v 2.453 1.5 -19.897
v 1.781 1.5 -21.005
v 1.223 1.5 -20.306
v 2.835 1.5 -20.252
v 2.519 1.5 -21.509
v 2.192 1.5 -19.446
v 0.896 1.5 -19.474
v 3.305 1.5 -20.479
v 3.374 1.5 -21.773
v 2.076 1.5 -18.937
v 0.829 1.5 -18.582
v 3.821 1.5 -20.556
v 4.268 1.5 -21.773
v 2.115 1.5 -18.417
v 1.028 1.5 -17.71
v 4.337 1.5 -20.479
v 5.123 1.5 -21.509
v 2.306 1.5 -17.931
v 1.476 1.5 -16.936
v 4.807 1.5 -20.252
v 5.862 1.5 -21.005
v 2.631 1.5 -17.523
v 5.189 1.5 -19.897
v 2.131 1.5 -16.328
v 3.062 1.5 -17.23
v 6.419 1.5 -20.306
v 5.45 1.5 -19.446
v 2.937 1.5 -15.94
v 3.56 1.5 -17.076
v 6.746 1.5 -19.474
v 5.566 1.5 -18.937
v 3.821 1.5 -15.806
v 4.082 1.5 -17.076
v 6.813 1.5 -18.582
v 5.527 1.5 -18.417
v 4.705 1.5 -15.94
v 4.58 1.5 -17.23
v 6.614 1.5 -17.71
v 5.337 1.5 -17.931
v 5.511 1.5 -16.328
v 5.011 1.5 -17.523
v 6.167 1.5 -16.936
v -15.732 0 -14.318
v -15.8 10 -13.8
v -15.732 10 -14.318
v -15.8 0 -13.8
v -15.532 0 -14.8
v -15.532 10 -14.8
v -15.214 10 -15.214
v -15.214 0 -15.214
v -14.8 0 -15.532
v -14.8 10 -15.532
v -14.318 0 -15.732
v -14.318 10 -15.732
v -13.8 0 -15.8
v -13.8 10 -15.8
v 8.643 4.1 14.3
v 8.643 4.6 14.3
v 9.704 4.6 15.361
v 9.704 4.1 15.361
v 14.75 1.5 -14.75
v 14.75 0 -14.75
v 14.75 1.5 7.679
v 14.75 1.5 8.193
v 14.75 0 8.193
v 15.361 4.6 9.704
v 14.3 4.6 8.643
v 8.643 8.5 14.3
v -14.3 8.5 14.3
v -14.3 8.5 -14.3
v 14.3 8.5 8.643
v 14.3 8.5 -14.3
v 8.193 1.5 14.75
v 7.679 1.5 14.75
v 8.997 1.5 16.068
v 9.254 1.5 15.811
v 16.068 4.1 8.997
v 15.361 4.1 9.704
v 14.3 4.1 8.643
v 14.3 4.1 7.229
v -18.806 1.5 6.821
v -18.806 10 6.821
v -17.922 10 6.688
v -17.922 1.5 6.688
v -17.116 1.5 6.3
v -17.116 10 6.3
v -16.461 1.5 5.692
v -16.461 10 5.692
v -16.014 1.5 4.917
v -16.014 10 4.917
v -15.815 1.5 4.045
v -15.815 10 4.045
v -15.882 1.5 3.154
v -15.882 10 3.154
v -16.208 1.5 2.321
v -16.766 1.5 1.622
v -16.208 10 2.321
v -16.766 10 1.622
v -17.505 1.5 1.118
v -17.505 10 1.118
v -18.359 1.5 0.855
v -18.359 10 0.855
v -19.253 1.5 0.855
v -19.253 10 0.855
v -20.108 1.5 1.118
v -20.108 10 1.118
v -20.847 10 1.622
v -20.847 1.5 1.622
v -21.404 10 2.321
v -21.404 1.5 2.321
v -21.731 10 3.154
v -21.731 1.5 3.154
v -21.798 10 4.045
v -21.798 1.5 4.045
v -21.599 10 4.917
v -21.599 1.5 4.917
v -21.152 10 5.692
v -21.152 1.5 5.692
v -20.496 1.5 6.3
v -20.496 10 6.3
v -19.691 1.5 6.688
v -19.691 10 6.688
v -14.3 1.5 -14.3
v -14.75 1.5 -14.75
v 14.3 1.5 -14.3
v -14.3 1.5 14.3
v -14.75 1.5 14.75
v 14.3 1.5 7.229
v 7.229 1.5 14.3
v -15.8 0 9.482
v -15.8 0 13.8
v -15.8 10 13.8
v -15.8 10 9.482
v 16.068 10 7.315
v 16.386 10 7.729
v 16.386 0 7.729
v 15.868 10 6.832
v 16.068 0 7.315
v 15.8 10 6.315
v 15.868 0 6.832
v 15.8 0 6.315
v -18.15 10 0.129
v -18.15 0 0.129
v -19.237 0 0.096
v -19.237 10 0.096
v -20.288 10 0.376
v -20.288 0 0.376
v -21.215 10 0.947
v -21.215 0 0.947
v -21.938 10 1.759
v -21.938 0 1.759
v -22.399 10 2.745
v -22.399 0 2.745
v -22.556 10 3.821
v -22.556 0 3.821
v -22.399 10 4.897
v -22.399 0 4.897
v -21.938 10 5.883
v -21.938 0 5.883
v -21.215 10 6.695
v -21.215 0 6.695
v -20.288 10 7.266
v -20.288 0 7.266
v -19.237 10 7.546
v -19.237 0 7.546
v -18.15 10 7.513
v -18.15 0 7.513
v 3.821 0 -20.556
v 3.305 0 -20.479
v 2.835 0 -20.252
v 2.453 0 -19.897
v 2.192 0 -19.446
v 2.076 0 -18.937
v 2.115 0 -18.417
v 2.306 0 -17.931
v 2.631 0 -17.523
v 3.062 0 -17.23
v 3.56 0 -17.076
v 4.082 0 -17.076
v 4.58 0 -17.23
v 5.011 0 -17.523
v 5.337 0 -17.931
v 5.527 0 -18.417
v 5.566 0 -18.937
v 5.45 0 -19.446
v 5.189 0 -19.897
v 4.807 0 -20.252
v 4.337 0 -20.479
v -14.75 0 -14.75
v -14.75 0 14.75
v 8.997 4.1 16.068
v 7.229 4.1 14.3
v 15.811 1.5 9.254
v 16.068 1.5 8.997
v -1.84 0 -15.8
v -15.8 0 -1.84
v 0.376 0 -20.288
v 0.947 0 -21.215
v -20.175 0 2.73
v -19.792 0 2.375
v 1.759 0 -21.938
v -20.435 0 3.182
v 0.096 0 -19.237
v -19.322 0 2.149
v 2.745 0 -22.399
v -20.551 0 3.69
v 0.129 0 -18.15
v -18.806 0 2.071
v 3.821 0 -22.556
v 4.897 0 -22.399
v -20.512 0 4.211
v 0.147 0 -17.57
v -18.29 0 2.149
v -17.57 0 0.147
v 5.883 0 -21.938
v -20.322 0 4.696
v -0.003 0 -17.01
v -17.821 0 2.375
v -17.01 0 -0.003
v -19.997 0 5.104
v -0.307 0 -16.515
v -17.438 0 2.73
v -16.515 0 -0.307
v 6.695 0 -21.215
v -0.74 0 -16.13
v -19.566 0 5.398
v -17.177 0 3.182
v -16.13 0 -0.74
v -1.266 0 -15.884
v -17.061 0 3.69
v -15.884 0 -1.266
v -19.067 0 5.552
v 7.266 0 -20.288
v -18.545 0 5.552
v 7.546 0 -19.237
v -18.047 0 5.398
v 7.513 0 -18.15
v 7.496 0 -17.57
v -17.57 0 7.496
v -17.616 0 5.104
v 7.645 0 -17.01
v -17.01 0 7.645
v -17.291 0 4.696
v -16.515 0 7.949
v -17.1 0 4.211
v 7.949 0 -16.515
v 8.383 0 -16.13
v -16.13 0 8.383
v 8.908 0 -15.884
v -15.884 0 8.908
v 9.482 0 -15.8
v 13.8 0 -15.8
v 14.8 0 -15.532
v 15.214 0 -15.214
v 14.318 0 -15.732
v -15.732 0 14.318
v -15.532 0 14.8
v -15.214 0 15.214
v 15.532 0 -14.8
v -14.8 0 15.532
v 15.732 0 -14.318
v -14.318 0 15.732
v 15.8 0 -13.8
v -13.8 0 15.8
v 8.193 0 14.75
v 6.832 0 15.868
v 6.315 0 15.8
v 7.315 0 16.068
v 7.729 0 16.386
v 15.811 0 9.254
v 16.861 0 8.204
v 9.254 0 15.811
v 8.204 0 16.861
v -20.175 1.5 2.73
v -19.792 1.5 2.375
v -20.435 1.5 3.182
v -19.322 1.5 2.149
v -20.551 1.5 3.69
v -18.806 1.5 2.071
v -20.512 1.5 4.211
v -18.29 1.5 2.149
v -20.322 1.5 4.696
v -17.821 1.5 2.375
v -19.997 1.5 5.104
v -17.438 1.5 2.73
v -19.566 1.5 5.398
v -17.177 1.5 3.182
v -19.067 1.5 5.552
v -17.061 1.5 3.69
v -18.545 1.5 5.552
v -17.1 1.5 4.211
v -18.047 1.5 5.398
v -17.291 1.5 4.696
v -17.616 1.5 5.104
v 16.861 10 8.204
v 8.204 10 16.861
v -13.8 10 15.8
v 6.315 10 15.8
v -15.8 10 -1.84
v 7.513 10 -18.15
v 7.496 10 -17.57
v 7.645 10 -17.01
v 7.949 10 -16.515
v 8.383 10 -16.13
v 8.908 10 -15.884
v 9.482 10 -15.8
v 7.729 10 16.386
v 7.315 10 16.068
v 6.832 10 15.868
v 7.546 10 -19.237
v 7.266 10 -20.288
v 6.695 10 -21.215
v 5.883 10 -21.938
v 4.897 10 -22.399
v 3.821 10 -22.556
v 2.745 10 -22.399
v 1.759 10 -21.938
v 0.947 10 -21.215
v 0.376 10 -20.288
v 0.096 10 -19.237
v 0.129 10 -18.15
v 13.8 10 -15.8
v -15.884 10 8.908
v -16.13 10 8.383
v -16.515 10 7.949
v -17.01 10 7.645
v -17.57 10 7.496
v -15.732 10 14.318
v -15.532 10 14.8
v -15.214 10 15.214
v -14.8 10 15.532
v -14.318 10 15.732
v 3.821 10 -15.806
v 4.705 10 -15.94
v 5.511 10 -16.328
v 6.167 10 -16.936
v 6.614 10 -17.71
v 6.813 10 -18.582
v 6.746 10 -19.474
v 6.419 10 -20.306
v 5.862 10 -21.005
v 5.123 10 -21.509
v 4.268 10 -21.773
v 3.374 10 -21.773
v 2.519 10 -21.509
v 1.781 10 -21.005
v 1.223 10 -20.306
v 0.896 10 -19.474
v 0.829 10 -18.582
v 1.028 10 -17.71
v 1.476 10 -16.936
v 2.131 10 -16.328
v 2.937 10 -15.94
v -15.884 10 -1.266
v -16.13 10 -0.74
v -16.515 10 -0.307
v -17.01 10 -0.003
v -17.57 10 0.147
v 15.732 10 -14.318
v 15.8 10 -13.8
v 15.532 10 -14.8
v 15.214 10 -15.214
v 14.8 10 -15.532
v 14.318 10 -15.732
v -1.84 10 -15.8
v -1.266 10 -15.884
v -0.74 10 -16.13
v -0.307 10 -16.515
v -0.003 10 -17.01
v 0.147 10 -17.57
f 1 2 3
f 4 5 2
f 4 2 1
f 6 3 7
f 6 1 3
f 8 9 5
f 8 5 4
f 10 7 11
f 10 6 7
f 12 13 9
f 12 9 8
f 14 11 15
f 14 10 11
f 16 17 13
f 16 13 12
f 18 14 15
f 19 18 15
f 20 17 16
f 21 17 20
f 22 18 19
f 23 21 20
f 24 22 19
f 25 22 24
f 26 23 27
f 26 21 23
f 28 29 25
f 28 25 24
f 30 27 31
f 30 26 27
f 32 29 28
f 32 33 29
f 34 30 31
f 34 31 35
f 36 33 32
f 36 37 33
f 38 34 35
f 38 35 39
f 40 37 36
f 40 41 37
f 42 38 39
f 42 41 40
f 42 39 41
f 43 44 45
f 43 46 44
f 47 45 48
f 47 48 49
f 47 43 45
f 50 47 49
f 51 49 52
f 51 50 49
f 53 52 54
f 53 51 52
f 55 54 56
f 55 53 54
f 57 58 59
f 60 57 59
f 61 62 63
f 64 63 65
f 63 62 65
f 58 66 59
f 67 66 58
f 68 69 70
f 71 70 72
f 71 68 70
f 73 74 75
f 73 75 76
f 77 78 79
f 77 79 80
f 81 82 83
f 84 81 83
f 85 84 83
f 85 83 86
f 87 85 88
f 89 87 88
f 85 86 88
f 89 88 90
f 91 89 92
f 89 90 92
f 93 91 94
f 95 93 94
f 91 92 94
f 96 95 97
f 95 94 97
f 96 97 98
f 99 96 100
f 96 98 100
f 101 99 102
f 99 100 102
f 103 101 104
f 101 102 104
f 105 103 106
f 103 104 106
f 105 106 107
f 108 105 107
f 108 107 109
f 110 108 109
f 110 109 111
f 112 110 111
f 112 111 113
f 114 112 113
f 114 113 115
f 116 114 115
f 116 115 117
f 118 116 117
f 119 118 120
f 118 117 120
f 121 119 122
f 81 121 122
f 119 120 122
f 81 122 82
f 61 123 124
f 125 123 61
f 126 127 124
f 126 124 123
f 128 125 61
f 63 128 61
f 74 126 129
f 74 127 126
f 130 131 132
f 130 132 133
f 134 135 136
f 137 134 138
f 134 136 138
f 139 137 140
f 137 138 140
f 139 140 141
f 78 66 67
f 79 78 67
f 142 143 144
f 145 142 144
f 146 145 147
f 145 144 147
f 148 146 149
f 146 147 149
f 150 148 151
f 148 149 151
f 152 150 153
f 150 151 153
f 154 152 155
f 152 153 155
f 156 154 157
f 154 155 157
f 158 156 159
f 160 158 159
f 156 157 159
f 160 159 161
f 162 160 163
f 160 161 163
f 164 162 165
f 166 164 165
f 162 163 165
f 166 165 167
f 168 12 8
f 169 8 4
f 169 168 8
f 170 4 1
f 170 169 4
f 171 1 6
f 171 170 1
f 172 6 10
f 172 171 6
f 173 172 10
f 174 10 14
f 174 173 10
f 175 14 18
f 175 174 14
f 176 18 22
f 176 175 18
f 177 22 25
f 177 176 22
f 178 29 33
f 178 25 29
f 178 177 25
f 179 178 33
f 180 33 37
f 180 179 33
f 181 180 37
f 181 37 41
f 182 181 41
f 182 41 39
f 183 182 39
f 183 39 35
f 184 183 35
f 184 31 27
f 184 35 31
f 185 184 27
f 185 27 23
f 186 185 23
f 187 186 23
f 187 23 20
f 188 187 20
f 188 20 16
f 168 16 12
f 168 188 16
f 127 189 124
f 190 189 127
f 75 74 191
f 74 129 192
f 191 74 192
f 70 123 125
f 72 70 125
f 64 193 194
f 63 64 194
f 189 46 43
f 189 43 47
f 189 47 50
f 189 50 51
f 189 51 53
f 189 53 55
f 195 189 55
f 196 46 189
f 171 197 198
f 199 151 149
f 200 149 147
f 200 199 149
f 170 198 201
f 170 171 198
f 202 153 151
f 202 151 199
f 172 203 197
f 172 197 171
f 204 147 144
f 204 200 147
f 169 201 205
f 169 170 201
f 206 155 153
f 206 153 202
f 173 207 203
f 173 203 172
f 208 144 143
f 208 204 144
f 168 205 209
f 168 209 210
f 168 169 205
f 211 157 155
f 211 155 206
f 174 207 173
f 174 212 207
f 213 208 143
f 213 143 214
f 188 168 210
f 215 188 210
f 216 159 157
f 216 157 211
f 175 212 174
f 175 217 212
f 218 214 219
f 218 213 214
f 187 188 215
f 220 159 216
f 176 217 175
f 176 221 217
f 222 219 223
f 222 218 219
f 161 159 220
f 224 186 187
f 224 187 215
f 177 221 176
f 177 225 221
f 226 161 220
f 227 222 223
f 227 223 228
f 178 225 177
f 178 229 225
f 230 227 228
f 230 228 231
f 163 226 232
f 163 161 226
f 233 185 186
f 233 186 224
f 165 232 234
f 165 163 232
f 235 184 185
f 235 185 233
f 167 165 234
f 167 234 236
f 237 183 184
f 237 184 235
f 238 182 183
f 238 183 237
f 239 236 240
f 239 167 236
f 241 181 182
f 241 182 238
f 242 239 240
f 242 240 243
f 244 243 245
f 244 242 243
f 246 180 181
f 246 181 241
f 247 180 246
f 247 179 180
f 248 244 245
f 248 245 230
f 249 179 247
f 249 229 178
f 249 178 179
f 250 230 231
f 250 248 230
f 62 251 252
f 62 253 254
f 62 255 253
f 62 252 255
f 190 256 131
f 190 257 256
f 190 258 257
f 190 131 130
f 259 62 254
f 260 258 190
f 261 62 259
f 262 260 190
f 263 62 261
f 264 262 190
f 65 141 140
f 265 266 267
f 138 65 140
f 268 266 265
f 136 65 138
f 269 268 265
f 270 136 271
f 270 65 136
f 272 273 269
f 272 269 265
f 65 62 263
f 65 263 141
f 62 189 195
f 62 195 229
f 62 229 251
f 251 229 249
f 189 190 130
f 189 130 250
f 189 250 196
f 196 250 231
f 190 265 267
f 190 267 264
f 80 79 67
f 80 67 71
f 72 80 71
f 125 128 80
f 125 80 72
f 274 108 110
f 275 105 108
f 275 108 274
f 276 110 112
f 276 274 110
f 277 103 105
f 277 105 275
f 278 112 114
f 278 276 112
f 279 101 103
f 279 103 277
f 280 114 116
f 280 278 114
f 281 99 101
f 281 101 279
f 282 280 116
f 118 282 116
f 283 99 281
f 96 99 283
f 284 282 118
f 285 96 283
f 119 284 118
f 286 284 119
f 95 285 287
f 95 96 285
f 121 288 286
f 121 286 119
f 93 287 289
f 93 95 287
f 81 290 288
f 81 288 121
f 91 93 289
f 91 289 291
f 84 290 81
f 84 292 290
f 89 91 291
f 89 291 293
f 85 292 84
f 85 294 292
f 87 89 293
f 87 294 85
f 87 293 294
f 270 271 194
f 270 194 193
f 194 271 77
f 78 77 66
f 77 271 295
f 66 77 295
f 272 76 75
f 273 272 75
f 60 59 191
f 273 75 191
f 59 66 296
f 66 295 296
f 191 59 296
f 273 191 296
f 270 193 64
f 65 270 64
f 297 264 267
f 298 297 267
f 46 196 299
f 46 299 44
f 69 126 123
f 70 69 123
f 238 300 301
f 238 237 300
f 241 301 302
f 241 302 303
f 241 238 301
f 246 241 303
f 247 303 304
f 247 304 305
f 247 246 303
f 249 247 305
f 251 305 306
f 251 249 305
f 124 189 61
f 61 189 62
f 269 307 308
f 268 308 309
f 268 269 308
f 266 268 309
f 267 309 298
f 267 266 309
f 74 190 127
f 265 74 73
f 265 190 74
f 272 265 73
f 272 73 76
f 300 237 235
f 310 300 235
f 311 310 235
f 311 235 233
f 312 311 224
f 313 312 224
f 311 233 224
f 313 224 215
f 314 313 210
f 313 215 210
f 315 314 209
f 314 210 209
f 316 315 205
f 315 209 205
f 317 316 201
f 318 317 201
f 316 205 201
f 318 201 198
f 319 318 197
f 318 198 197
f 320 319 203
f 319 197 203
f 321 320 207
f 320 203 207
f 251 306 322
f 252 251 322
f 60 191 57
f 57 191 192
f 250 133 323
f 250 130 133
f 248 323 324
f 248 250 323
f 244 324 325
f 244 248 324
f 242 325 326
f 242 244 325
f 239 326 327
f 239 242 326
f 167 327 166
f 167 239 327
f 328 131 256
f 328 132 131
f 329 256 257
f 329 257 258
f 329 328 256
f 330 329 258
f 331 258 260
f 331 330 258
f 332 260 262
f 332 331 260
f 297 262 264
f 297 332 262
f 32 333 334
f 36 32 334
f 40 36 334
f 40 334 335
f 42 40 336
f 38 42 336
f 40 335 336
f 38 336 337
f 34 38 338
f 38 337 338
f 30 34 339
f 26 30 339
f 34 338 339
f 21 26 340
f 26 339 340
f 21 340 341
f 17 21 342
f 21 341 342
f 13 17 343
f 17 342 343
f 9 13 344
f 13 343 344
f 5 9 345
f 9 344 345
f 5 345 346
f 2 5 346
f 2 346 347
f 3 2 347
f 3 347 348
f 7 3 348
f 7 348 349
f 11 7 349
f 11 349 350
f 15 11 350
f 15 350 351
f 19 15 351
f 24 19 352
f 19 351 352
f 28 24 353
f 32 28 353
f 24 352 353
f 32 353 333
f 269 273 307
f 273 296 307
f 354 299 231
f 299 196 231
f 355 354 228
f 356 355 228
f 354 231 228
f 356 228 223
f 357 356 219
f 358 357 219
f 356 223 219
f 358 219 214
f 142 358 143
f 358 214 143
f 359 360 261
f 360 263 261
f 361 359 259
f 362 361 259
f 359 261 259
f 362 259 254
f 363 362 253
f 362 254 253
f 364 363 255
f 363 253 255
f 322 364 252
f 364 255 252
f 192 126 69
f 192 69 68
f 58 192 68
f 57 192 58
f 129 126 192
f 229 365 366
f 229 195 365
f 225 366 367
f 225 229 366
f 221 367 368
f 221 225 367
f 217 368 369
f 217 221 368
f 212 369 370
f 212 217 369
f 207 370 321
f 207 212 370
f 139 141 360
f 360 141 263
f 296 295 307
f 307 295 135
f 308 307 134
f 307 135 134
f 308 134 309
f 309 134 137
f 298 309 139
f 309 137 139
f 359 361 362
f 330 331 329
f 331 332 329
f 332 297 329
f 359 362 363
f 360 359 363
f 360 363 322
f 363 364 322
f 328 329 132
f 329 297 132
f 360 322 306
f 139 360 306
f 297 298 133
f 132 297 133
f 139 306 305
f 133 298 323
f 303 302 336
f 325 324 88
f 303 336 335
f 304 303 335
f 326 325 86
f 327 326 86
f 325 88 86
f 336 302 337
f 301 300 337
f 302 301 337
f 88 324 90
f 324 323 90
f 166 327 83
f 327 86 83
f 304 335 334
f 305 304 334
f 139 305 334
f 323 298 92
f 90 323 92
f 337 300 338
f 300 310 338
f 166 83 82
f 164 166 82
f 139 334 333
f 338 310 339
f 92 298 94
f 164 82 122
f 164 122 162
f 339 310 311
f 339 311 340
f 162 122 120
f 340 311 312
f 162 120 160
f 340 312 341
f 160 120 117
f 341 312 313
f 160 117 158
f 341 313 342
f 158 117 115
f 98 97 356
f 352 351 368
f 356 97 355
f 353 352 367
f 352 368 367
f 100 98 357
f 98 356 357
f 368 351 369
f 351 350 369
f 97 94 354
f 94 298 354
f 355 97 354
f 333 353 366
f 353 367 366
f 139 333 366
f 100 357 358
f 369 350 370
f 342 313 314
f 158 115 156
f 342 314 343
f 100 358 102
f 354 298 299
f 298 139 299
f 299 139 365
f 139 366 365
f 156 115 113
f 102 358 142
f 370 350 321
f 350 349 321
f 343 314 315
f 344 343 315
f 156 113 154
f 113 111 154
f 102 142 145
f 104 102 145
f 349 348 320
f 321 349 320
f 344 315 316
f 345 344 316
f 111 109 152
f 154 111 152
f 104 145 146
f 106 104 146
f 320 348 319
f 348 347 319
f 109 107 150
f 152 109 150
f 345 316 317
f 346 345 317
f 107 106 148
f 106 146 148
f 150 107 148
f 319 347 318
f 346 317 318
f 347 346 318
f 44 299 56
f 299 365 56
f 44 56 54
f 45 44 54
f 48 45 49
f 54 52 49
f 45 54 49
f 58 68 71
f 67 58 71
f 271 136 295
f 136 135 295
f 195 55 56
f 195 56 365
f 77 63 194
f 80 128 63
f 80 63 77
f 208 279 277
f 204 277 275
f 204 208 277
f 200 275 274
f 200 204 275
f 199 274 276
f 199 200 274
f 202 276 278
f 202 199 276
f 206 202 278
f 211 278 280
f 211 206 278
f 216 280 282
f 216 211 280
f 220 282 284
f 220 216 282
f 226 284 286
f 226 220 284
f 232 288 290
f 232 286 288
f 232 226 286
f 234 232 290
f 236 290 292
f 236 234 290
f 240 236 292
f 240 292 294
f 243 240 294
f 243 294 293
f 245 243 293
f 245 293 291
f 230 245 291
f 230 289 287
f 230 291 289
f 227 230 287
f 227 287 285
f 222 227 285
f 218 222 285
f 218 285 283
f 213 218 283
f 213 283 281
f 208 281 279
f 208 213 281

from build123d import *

# Parameters (mm, degrees)
SKETCH1_W           = 31.6
SKETCH1_H           = 31.6
SKETCH1_W_2         = 28.6
SKETCH1_H_2         = 28.6
BOSS_EXTRUDE1_DEPTH = 10
SKETCH2_W           = 31.6
SKETCH2_H           = 31.6
BOSS_EXTRUDE2_DEPTH = 1.5
FILLET2_R           = 2
SKETCH3_R           = 3.75
SKETCH3_R_2         = 1.75
BOSS_EXTRUDE3_DEPTH = 10
SKETCH4_R           = 3
CUT_EXTRUDE1_DEPTH  = 8.5
CUT_EXTRUDE2_REACH  = 35.43
SKETCH6_W           = 29.5
SKETCH6_H           = 29.5
CUT_EXTRUDE3_DEPTH  = 1.5
FILLET3_R           = 2
BOSS_EXTRUDE4_DEPTH = 5.4
BOSS_EXTRUDE5_DEPTH = 4.6
BOSS_EXTRUDE6_DEPTH = 3.1
FILLET4_R           = 2
CUT_EXTRUDE6_START  = -2.5
SKETCH12_W          = 10
SKETCH12_H          = 2.6
CUT_EXTRUDE6_DEPTH  = 2.5


with BuildPart() as part:
    # Sketch1 → Boss-Extrude1 (new body)
    with BuildSketch(Plane(origin=(0, 0, 0), x_dir=(1, 0, 0), z_dir=(0, 1, 0))):
        Rectangle(SKETCH1_W, SKETCH1_H)
        Rectangle(SKETCH1_W_2, SKETCH1_H_2, mode=Mode.SUBTRACT)
    extrude(amount=BOSS_EXTRUDE1_DEPTH)

    # Sketch2 → Boss-Extrude2 (add)
    with BuildSketch(Plane.XZ.offset(-10)):
        Rectangle(SKETCH2_W, SKETCH2_H)
    extrude(amount=BOSS_EXTRUDE2_DEPTH)

    # Fillet2
    fillet2_edges = [part.edges().sort_by_distance(p)[0] for p in [
        (-15.8, 5, -15.8),
        (15.8, 5, -15.8),
        (15.8, 5, 15.8),
        (-15.8, 5, 15.8),
    ]]
    fillet(fillet2_edges, radius=FILLET2_R)

    # Sketch3 → Boss-Extrude3 (add)
    # profile 1 of 2: a face of its own
    with BuildSketch(Plane(origin=(0, 0, 0), x_dir=(1, 0, 0), z_dir=(0, 1, 0))):
        with Locations((-18.806316011, -3.821100987)):
            Circle(SKETCH3_R)
        with Locations(Location((-18.806316011, -3.821100987, 0), (0, 0, 90))):
            Circle(SKETCH3_R_2, mode=Mode.SUBTRACT)
    # profile 2 of 2: a face of its own
    with BuildSketch(Plane(origin=(0, 0, 0), x_dir=(1, 0, 0), z_dir=(0, 1, 0))):
        with Locations((3.821100987, 18.806316011)):
            Circle(SKETCH3_R)
        with Locations(Location((3.821100987, 18.806316011, 0), (0, 0, 90))):
            Circle(SKETCH3_R_2, mode=Mode.SUBTRACT)
    extrude(amount=BOSS_EXTRUDE3_DEPTH)

    # Sketch4 → Cut-Extrude1 (cut)
    with BuildSketch(Plane(origin=(0, 10, 0), x_dir=(1, 0, 0), z_dir=(0, 1, 0))):
        with Locations(Location((-18.806316011, -3.821100987, 0), (0, 0, 270))):
            Circle(SKETCH4_R)
        with Locations(Location((3.821100987, 18.806316011, 0), (0, 0, 270))):
            Circle(SKETCH4_R)
    extrude(amount=-CUT_EXTRUDE1_DEPTH, mode=Mode.SUBTRACT)

    # Sketch5 → Cut-Extrude2 (cut, up to next)
    with BuildSketch(Plane.XZ, mode=Mode.PRIVATE) as cut_extrude2_sk1:
        Polygon((14.3, 14.3), (8.643145751, 14.3), (14.3, 8.643145751), align=None)
    cut_extrude2_tool1 = extrude(cut_extrude2_sk1.sketch, amount=-CUT_EXTRUDE2_REACH, mode=Mode.PRIVATE) & part.part
    # Sketch5 → Cut-Extrude2 (cut, up to next)
    with BuildSketch(Plane.XZ, mode=Mode.PRIVATE) as cut_extrude2_sk2:
        with BuildLine():
            Line((13.8, 15.8), (7.143145751, 15.8))
            Line((7.143145751, 15.8), (8.643145751, 14.3))
            Line((8.643145751, 14.3), (14.3, 14.3))
            Line((14.3, 14.3), (14.3, 8.643145751))
            Line((14.3, 8.643145751), (15.8, 7.143145751))
            Line((15.8, 7.143145751), (15.8, 13.8))
            ThreePointArc((15.8, 13.8), (15.214213562, 15.214213562), (13.8, 15.8))
        make_face()
    cut_extrude2_tool2 = extrude(cut_extrude2_sk2.sketch, amount=-CUT_EXTRUDE2_REACH, mode=Mode.PRIVATE) & part.part
    add(cut_extrude2_tool1.solids().sort_by_distance((12.414382, 0, 12.414382))[0], mode=Mode.SUBTRACT)
    add(cut_extrude2_tool2.solids().sort_by_distance((15.127645, 0, 15.127645))[0], mode=Mode.SUBTRACT)

    # Sketch6 → Cut-Extrude3 (cut)
    with BuildSketch(Plane.XZ):
        Rectangle(SKETCH6_W, SKETCH6_H)
    extrude(amount=-CUT_EXTRUDE3_DEPTH, mode=Mode.SUBTRACT)

    # Fillet3
    fillet3_edges = [part.edges().sort_by_distance(p)[0] for p in [
        (6.062654922, 5, -15.8),
        (1.579547052, 5, -15.8),
        (-15.8, 5, 1.579547052),
        (-15.8, 5, 6.062654922),
    ]]
    fillet(fillet3_edges, radius=FILLET3_R)

    # Sketch7 → Boss-Extrude4 (add)
    with BuildSketch(Plane(origin=(0, 10, 0), x_dir=(1, 0, 0), z_dir=(0, 1, 0))):
        Polygon((8.203805922, -16.860660172), (7.143145751, -15.8), (15.8, -7.143145751), (16.860660172, -8.203805922), align=None)
    extrude(amount=-BOSS_EXTRUDE4_DEPTH)

    # Sketch8 → Boss-Extrude5 (add)
    with BuildSketch(Plane.XZ.offset(-4.6)):
        Polygon((7.143145751, 15.8), (8.193145751, 14.75), (9.253805922, 15.810660172), (8.203805922, 16.860660172), align=None)
        Polygon((16.860660172, 8.203805922), (15.810660172, 9.253805922), (14.75, 8.193145751), (15.8, 7.143145751), align=None)
    extrude(amount=BOSS_EXTRUDE5_DEPTH)

    # Sketch9 → Boss-Extrude6 (add)
    with BuildSketch(Plane.XZ.offset(-4.6)):
        Polygon((8.193145751, 14.75), (8.643145751, 14.3), (9.703805922, 15.360660172), (9.253805922, 15.810660172), align=None)
        Polygon((15.360660172, 9.703805922), (14.3, 8.643145751), (14.75, 8.193145751), (15.810660172, 9.253805922), align=None)
    extrude(amount=BOSS_EXTRUDE6_DEPTH)

    # Fillet4
    fillet4_edges = [part.edges().sort_by_distance(p)[0] for p in [
        (7.143145751, 5, 15.8),
        (15.8, 5, 7.143145751),
    ]]
    fillet(fillet4_edges, radius=FILLET4_R)

    # Sketch12 → Cut-Extrude6 (cut)
    with BuildSketch(Plane(origin=(12.532233047, 0, 12.532233047), x_dir=(0.7071067811865475, 0, -0.7071067811865477), z_dir=(0.7071067811865477, 0, 0.7071067811865475)).offset(CUT_EXTRUDE6_START)):
        with Locations((0, 2.8)):
            Rectangle(SKETCH12_W, SKETCH12_H)
    extrude(amount=CUT_EXTRUDE6_DEPTH, mode=Mode.SUBTRACT)


solid = part.part
